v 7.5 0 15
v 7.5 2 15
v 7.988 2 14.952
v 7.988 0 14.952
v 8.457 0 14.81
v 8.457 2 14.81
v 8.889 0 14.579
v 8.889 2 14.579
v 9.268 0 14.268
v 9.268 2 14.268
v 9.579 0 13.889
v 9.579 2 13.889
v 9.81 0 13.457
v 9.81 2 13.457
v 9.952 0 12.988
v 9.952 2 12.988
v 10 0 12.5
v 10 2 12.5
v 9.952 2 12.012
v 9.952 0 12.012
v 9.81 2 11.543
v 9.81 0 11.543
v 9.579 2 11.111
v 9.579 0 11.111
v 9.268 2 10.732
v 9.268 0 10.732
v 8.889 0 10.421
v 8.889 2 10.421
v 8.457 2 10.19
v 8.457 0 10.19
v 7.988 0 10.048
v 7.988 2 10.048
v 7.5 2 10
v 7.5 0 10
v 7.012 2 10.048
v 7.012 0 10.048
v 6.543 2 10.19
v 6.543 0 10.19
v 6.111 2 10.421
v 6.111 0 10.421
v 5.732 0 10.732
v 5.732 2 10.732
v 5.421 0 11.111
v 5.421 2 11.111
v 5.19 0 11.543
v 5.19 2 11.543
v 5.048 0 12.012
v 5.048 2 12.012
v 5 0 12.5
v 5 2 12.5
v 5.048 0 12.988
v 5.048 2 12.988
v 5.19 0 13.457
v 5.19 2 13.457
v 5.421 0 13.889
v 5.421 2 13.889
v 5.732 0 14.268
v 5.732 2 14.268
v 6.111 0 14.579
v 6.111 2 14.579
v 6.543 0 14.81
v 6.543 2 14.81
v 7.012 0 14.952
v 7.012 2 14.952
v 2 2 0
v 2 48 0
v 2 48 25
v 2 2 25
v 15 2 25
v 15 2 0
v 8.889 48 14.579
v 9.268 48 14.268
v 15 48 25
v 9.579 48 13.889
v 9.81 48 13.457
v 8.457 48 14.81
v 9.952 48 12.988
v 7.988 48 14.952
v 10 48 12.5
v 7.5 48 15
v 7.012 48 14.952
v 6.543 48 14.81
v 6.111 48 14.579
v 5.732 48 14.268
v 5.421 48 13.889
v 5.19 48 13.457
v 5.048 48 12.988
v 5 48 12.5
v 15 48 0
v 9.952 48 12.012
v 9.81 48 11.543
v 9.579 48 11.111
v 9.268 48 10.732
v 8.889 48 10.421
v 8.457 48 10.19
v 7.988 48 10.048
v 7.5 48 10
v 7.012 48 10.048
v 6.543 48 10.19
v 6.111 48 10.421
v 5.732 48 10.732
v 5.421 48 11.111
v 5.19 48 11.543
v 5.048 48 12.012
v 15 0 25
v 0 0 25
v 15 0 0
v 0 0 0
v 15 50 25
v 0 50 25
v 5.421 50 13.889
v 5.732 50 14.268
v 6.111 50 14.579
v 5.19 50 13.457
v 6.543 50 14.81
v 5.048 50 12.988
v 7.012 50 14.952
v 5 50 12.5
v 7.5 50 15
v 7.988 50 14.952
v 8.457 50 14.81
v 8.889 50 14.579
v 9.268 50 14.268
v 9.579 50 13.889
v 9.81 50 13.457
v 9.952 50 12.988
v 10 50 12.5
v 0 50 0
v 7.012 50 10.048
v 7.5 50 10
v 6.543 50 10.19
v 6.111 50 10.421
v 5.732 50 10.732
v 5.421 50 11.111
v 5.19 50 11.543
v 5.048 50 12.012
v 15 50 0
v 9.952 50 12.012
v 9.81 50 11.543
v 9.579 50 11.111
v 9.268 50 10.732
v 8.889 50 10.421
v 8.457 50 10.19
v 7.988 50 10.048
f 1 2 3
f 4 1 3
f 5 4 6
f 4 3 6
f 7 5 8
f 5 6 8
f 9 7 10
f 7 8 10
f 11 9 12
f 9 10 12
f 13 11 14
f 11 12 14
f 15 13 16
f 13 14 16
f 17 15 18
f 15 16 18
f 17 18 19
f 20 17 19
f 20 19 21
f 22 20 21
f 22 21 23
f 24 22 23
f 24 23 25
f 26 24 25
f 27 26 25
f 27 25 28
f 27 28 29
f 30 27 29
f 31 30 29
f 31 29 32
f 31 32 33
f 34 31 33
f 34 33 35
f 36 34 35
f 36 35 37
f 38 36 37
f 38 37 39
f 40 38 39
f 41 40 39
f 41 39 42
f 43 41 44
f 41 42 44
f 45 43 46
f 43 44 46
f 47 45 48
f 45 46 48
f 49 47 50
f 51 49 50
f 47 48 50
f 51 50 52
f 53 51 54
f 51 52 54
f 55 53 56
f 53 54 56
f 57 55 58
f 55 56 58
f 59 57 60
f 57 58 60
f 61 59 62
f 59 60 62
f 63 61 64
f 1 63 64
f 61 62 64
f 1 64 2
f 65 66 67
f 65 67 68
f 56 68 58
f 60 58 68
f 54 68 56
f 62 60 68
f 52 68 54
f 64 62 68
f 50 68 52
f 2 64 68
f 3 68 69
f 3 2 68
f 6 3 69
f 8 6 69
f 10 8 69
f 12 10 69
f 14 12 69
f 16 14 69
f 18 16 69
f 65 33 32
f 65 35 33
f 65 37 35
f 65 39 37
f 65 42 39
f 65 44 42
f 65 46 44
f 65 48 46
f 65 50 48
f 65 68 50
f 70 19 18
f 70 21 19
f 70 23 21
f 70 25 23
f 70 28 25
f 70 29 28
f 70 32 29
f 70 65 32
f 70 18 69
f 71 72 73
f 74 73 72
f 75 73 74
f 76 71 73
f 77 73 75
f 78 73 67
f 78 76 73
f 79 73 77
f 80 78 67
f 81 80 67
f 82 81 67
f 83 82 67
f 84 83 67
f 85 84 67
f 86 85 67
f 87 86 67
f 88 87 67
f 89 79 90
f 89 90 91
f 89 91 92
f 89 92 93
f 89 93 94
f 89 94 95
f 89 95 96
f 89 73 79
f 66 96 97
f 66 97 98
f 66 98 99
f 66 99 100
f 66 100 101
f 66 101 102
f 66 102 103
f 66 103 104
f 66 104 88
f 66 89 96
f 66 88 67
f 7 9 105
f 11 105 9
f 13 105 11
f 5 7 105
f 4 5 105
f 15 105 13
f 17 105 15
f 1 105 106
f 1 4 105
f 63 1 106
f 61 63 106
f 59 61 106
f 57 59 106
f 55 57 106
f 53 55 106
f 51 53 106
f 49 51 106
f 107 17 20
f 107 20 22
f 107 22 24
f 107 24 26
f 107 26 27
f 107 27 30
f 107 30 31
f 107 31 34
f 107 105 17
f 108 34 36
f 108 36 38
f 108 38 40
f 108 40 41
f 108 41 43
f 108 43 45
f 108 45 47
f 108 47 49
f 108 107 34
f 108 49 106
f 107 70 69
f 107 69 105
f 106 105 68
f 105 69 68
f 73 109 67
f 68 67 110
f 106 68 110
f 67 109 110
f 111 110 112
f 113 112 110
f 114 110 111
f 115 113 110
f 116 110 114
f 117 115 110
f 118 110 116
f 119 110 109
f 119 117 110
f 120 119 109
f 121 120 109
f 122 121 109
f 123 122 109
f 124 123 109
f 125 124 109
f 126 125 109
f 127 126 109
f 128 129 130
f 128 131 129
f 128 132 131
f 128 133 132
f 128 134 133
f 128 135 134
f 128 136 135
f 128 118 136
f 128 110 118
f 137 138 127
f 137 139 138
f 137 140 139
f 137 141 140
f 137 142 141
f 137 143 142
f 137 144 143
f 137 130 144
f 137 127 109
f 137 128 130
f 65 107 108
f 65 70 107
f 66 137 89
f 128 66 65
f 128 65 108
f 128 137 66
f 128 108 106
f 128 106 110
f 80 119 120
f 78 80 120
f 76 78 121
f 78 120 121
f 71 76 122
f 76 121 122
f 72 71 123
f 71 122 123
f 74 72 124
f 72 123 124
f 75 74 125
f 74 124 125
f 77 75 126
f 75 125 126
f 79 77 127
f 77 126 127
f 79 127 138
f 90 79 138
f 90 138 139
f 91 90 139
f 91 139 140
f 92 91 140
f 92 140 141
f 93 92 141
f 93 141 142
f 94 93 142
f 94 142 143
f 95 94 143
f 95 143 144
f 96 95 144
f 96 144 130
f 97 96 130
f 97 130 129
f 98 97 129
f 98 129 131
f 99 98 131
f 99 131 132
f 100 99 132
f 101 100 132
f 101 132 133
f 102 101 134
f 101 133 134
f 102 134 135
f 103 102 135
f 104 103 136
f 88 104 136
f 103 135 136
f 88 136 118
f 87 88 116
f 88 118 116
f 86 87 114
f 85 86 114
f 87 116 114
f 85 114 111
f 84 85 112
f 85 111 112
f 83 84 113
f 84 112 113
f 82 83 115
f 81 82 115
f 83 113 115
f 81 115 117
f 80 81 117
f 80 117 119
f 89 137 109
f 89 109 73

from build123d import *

# Parameters (mm, degrees)
SALIENTE_EXTRUIR1_DEPTH = 25
CROQUIS2_R              = 2.5
CORTAR_EXTRUIR1_DEPTH   = 58.879184514


with BuildPart() as part:
    # Croquis1 → Saliente-Extruir1 (new body)
    with BuildSketch(Plane.XY):
        Polygon((15, 0), (0, 0), (0, 50), (15, 50), (15, 48), (2, 48), (2, 2), (15, 2), align=None)
    extrude(amount=SALIENTE_EXTRUIR1_DEPTH)

    # Croquis2 → Cortar-Extruir1 (cut, through all)
    with BuildSketch(Plane(origin=(0, 50, 0), x_dir=(1, 0, 0), z_dir=(0, 1, 0))):
        with Locations(Location((7.5, -12.5, 0), (0, 0, 270))):
            Circle(CROQUIS2_R)
    extrude(amount=-CORTAR_EXTRUIR1_DEPTH, mode=Mode.SUBTRACT)


solid = part.part
